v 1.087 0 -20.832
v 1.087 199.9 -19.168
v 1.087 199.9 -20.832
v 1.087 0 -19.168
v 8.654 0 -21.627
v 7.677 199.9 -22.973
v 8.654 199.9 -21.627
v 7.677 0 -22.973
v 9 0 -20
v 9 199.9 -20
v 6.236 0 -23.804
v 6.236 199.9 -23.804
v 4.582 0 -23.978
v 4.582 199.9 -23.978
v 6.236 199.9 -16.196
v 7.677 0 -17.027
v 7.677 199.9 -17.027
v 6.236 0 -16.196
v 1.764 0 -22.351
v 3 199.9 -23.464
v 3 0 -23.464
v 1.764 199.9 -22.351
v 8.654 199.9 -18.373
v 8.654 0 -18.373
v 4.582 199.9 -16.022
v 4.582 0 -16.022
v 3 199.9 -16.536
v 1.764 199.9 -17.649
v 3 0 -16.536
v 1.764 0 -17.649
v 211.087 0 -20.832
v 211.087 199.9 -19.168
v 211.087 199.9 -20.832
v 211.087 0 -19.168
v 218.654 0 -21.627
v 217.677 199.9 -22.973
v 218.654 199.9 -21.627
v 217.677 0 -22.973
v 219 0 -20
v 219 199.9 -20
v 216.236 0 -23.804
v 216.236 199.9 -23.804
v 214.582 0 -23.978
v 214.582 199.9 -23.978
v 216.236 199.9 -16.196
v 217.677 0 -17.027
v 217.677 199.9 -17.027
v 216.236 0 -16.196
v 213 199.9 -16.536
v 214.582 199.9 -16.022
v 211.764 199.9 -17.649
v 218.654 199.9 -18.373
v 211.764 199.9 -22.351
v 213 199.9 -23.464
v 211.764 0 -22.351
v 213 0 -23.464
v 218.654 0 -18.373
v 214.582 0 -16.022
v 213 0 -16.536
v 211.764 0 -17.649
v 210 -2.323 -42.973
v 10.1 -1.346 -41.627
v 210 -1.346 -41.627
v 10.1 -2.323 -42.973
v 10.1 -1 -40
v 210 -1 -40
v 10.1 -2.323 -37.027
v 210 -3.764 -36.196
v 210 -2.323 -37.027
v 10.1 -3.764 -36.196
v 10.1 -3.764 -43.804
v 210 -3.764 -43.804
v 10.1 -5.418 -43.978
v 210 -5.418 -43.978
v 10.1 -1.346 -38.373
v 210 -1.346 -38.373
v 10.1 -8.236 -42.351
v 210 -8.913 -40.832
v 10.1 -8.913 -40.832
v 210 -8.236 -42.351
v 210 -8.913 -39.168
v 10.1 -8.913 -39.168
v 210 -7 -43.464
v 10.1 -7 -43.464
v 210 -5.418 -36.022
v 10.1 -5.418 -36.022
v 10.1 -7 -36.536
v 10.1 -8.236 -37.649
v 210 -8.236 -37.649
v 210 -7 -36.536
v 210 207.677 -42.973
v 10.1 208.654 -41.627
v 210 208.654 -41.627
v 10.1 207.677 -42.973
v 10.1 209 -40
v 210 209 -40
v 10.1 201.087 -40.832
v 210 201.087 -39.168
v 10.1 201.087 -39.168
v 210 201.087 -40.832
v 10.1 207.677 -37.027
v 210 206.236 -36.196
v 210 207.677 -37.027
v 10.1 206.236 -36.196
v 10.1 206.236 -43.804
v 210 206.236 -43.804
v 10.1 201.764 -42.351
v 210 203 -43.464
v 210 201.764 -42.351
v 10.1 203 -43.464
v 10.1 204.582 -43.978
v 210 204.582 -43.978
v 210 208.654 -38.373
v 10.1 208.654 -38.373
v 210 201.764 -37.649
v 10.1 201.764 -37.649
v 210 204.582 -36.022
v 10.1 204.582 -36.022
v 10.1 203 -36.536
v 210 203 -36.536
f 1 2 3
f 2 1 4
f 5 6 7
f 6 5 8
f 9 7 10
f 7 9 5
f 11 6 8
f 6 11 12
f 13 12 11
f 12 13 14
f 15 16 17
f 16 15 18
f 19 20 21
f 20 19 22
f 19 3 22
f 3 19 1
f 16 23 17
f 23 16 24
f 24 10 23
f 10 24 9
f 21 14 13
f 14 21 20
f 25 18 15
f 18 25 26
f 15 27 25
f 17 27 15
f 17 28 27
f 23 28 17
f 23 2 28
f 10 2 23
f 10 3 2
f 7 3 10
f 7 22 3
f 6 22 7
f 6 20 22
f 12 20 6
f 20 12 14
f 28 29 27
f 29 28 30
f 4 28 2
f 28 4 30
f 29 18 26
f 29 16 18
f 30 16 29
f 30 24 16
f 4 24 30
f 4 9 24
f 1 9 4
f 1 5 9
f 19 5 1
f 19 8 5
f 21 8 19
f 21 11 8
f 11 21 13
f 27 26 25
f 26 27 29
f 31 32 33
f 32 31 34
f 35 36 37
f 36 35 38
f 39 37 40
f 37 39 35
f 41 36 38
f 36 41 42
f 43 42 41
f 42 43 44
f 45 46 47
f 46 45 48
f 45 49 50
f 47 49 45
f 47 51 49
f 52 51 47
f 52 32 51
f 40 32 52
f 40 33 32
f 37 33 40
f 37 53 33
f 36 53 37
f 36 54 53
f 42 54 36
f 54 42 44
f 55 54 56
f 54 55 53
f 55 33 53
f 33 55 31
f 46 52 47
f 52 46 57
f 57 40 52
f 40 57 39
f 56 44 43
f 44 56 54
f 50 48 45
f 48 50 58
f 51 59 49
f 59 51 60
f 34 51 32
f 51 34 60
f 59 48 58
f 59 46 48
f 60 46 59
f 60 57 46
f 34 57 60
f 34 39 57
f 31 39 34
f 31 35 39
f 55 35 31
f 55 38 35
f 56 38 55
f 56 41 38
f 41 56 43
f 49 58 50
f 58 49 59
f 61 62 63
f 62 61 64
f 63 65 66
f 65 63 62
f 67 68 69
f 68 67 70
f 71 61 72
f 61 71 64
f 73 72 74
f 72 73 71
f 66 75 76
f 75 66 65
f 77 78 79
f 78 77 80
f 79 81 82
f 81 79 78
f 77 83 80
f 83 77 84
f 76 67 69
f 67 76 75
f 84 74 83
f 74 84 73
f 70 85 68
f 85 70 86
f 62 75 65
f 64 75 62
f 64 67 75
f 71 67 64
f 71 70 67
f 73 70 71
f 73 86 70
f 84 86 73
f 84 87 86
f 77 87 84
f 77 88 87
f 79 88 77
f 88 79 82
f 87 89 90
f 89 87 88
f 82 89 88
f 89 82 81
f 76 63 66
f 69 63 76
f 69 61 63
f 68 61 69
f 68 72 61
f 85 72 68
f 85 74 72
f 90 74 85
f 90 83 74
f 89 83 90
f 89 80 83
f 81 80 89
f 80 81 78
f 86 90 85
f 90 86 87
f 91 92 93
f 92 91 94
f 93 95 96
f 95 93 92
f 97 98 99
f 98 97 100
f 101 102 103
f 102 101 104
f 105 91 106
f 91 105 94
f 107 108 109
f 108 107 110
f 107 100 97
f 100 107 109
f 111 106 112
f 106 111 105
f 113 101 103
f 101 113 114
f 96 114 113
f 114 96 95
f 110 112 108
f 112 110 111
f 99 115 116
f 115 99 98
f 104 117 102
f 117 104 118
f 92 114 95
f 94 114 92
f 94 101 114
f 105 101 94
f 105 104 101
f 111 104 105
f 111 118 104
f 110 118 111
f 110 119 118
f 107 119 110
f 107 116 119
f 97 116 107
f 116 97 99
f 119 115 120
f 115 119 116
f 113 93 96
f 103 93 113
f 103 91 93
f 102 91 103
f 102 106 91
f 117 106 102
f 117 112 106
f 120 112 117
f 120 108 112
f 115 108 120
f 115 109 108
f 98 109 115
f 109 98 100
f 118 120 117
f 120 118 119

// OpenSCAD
// file: ../../materials.scad
use <config.scad>;

module printed(material) {

    module if_enabled_material(enabled_materials, query, index) {
        if (enabled_materials[index] == query) {
            children();
        } else {
            if (index < len(enabled_materials)) {
                if_enabled_material(enabled_materials, query, index + 1) children();
            }
        }
    }

    if_enabled_material(enabled_materials_filter(), material, 0)
        children();
}
module not_printed() {
    if (!only_show_printable())
        children();
}

module metal(color = "silver") {
    not_printed() color(color) children();
}

module jitter_color(c) {
    amount = 0.1;
    d = [
        min(1, max(0, c[0] + c[0] * rands(-amount,amount,1)[0])),
        min(1, max(0, c[1] + c[1] * rands(-amount,amount,1)[0])),
        min(1, max(0, c[2] + c[2] * rands(-amount,amount,1)[0]))
    ];
    color(d) children();
}

module brass() {
    not_printed() jitter_color([181 / 255, 166 / 255, 66 / 255]) children();
}

module PLA() {
    printed("PLA") jitter_color([100 / 255, 149 / 255, 237 / 255]) children();
}

module PETG() {
    printed("PETG") jitter_color([57 / 255, 255 / 255, 11 / 255]) children();
}

module nylon() {
    printed("Nylon") jitter_color(color("grey")) children();
}
// file: ../../config.scad
//Display helpers
function only_show_printable() = false;
function enabled_materials_filter() = [
    "PLA",
    "PETG",
    "Nylon"
];

//Bearings
function LM8UU_Pressure_Fit_Extra_Diameter() = 0.3;

//Smooth rods
function Rod_Pressure_Fit_Extra_Diameter() = 0.5;

//X Axis
function X_Axis_Rod_Separation() = 34;                          // Distance between rods
function X_Axis_Carriage_Rod_Vertical_Space() = 4;              // Distance between rods and the bearings they rest on
function X_Axis_Carriage_Mid_Bearing_Surround() = 3;            // Amount of plastic around the bearing (in the mid part of the carriage)
function X_Axis_Carriage_Rod_Surround_Extra_Diameter() = 12;    //Amount of plastic around the rods attaching them to the carriage
function X_Axis_Carriage_Screw_Guide_Diameter() = 10;
function X_Axis_Carriage_Screw_Hole_Diameter() = 3.7;
function X_Axis_Carriage_Screw_Hole_Z_Offset() = 2.5;
function X_Axis_Carriage_Bottom_Screw_Hole_Z_Offset() = -1;
function X_Axis_Carriage_Bottom_Screw_Hole_X_Offset() = 4;
function X_Axis_Carriage_Idler_Extra_Diameter() = 2;            //Extra space to put around the idlers
function X_Axis_Carriage_Idler_Extra_Height() = 1;              //Extra space to put above and below idlers
function X_Axis_Carriage_Idler_Vertical_Separation() = 0.5;     //Vertical space between the two idlers
function X_Axis_Carriage_Inner_Extra_Height() = 4;
function X_Axis_Belt_Hole_Extra_Clearance() = 3;

//Y Axis
// -- No config

//Unified Axis
function U_Axis_Carriage_Screw_Guide_Diameter() = 10;
function U_Axis_Carriage_Screw_Hole_Diameter() = 3.7;

//Tool Carriage
function Carriage_Bearing_Separation() = 1;                     // Distance between bearings on the carriage (along rods)
function Carriage_Clamp_Reduce_Length() = 1;                    // How much shorter is the hotend clamp than the length of the carriage
function Carriage_Clamp_Hotend_Fix_Extra_Diameter() = 0.1;      // How much extra diameter to allow inside the hotend clamp
function Carriage_Concealed_Nut_Head_Depth() = 1.75;            // Depth of the hole for the bolt head/nut concealed beneath the carriage bearings
function Carriage_Half_Separation() = 0.35;
function Carriage_End_Rounded_Radius() = 2.5;

//Hotend retainer (part of carriage)
function Hotend_Retainer_Extra_Diameter() = 2.5;            // Diameter of the retaining ring around the hotend mounting point
function Hotend_Retainer_Pressfit_Extra_Diameter() = 0.15;  //Extra diameter to allow for the pressure fit of the hotend retainer
// main file
use <../../config.scad>;
use <../../materials.scad>;

module frame() {

    //rods (0.2mm shorter than reality, to prevent artifacts in rendering)
    metal() {
        translate([5, 0, -20]) rotate([-90, 0, 0]) cylinder(d = 8, 199.9, $fn = 15);
        translate([215, 0, -20]) rotate([-90, 0, 0]) cylinder(d = 8, 199.9, $fn = 15);

        translate([210, -5, -40]) rotate([-90, 0, 90]) cylinder(d = 8, 199.9, $fn = 15);
        translate([210, 205, -40]) rotate([-90, 0, 90]) cylinder(d = 8, 199.9, $fn = 15);
    }
}

frame();
